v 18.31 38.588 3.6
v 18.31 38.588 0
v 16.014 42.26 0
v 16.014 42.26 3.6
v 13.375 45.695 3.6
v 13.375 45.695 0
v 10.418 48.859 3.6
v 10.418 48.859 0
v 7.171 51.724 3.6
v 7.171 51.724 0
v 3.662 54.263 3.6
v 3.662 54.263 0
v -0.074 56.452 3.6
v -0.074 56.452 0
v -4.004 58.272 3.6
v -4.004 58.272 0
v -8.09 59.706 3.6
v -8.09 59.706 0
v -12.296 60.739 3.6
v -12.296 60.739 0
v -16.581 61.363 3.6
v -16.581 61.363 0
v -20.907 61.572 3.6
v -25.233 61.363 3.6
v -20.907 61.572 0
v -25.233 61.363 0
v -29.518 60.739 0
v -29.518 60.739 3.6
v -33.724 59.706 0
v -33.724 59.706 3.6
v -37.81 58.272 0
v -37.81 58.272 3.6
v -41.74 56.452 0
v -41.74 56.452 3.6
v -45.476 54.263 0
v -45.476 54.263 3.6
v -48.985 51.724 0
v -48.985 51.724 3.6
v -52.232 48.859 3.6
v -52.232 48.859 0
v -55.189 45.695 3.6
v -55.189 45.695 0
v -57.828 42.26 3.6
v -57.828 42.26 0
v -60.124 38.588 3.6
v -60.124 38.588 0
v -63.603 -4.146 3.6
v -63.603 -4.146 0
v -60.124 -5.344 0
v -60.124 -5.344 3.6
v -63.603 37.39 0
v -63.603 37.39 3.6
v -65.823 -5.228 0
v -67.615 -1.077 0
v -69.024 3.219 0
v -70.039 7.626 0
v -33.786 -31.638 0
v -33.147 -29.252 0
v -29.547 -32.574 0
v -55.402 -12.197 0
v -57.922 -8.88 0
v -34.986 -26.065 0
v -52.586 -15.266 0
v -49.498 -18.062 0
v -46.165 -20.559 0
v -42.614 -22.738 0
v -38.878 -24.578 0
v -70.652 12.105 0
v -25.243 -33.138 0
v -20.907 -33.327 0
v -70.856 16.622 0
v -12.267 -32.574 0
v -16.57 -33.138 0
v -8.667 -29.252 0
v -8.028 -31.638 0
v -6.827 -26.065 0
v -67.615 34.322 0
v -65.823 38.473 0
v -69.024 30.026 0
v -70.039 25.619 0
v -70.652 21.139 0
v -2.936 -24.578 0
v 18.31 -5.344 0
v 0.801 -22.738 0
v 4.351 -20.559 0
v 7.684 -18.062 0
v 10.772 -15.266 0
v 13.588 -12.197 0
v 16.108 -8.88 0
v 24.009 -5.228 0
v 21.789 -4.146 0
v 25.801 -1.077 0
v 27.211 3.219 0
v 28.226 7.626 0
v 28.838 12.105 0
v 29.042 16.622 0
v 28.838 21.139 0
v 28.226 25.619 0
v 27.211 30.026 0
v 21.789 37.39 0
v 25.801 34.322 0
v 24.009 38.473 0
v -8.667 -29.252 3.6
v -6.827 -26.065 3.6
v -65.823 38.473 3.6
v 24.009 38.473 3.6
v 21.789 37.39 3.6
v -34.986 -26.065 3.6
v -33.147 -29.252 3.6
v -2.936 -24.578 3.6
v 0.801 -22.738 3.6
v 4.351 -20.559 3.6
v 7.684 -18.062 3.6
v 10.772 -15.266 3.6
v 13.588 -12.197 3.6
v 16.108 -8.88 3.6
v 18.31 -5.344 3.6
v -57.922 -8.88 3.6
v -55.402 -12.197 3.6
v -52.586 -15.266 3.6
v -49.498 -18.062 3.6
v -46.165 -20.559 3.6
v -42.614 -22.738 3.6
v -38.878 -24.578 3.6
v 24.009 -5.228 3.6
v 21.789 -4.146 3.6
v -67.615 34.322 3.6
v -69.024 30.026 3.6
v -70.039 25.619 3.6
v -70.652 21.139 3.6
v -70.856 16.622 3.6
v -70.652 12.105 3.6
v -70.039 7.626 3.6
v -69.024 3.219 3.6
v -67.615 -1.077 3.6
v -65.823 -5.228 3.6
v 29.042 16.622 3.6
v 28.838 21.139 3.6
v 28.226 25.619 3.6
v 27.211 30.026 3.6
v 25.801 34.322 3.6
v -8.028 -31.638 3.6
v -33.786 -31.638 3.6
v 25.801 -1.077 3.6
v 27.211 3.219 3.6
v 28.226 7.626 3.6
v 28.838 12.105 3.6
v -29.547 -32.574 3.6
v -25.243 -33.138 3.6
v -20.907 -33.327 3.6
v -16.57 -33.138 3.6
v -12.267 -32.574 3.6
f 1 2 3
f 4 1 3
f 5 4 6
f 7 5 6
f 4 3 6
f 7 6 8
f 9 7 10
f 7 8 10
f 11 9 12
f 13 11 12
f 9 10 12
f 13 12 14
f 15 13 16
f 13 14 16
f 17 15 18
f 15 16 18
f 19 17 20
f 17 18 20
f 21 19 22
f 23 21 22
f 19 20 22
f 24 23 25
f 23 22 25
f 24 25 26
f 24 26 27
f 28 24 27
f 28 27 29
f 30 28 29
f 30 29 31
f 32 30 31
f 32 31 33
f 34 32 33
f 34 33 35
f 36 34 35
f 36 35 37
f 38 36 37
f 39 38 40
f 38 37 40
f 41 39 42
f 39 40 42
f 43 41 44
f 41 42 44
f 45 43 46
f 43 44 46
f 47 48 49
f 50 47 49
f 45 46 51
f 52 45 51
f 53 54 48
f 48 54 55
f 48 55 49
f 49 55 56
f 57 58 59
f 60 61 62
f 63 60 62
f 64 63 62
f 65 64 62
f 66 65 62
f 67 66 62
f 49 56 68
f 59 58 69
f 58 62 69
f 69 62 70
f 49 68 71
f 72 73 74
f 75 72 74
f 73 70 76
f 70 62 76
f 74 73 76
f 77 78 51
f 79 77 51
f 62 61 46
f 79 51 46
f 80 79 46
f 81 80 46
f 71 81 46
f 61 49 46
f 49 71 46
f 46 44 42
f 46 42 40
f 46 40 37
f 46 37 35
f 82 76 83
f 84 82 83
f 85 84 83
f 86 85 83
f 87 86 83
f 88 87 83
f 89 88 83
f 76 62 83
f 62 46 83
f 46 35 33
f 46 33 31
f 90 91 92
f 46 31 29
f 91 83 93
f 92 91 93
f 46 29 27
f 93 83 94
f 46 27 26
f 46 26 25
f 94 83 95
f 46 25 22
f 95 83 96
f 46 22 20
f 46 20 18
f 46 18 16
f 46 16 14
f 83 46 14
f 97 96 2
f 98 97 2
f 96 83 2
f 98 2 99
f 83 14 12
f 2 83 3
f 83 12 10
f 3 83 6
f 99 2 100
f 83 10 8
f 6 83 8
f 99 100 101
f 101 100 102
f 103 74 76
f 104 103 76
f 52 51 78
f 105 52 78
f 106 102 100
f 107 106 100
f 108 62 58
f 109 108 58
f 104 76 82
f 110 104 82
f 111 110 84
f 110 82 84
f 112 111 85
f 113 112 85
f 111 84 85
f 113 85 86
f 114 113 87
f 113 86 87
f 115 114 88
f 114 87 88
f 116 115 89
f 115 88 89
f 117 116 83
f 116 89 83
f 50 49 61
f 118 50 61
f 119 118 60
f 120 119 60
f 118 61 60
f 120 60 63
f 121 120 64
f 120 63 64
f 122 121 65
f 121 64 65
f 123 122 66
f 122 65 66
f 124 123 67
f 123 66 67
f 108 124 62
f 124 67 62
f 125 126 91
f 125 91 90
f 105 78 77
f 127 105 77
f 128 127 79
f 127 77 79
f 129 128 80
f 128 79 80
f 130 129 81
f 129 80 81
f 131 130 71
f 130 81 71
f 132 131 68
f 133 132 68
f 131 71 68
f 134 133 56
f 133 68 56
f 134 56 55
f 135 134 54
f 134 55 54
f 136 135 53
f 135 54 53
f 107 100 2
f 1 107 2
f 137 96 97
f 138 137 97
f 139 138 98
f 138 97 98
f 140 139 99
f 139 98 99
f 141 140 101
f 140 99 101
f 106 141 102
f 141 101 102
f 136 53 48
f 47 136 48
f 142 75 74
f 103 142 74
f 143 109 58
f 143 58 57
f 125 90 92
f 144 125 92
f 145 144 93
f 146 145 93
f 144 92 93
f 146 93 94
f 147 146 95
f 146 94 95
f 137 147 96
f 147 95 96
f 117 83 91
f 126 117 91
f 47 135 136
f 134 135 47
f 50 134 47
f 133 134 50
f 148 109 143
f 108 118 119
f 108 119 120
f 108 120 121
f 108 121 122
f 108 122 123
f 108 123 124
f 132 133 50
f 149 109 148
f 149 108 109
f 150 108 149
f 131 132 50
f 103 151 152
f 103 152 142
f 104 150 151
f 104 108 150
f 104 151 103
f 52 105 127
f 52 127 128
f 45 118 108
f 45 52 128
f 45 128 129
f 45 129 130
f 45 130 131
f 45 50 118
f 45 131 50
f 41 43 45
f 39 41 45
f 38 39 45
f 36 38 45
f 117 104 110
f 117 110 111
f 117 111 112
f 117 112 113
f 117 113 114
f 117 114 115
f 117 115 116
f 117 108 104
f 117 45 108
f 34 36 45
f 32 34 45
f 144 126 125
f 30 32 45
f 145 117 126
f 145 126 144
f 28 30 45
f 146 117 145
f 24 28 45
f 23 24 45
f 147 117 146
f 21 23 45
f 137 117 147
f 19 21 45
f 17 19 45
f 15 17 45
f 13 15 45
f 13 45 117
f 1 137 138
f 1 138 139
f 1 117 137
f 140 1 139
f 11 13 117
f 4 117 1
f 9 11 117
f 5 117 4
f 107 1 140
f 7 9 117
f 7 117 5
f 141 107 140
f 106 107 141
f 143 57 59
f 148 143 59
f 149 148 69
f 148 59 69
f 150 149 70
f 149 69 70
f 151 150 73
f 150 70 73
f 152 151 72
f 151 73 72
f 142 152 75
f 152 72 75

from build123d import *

# Parameters (mm, degrees)
BOSS_EXTRUDE1_DEPTH = 3.6


with BuildPart() as part:
    # Sketch1 → Boss-Extrude1 (new body)
    with BuildSketch(Plane.XY):
        with BuildLine():
            Line((-33.14651631, -29.251901051), (-33.785882697, -31.638048893))
            ThreePointArc((-33.785882697, -31.638048893), (-20.906933284, -33.326956191), (-8.027983871, -31.638048893))
            Line((-8.027983871, -31.638048893), (-8.667350258, -29.251901051))
            Line((-8.667350258, -29.251901051), (-6.827368119, -26.064958502))
            ThreePointArc((-6.827368119, -26.064958502), (7.684388547, -18.061622736), (18.309654204, -5.343596369))
            Line((18.309654204, -5.343596369), (21.789128786, -4.145517191))
            Line((21.789128786, -4.145517191), (24.009439514, -5.228435089))
            ThreePointArc((24.009439514, -5.228435089), (29.042447028, 16.622424121), (24.009439514, 38.473283331))
            Line((24.009439514, 38.473283331), (21.789128786, 37.390365433))
            Line((21.789128786, 37.390365433), (18.309654204, 38.588444611))
            ThreePointArc((18.309654204, 38.588444611), (-20.906933284, 61.571804433), (-60.123520772, 38.588444611))
            Line((-60.123520772, 38.588444611), (-63.602995354, 37.390365433))
            Line((-63.602995354, 37.390365433), (-65.823306082, 38.473283331))
            ThreePointArc((-65.823306082, 38.473283331), (-70.856313596, 16.622424121), (-65.823306082, -5.228435089))
            Line((-65.823306082, -5.228435089), (-63.602995354, -4.145517191))
            Line((-63.602995354, -4.145517191), (-60.123520772, -5.343596369))
            ThreePointArc((-60.123520772, -5.343596369), (-49.498255115, -18.061622736), (-34.986498448, -26.064958502))
            Line((-34.986498448, -26.064958502), (-33.14651631, -29.251901051))
        make_face()
    extrude(amount=BOSS_EXTRUDE1_DEPTH)


solid = part.part
